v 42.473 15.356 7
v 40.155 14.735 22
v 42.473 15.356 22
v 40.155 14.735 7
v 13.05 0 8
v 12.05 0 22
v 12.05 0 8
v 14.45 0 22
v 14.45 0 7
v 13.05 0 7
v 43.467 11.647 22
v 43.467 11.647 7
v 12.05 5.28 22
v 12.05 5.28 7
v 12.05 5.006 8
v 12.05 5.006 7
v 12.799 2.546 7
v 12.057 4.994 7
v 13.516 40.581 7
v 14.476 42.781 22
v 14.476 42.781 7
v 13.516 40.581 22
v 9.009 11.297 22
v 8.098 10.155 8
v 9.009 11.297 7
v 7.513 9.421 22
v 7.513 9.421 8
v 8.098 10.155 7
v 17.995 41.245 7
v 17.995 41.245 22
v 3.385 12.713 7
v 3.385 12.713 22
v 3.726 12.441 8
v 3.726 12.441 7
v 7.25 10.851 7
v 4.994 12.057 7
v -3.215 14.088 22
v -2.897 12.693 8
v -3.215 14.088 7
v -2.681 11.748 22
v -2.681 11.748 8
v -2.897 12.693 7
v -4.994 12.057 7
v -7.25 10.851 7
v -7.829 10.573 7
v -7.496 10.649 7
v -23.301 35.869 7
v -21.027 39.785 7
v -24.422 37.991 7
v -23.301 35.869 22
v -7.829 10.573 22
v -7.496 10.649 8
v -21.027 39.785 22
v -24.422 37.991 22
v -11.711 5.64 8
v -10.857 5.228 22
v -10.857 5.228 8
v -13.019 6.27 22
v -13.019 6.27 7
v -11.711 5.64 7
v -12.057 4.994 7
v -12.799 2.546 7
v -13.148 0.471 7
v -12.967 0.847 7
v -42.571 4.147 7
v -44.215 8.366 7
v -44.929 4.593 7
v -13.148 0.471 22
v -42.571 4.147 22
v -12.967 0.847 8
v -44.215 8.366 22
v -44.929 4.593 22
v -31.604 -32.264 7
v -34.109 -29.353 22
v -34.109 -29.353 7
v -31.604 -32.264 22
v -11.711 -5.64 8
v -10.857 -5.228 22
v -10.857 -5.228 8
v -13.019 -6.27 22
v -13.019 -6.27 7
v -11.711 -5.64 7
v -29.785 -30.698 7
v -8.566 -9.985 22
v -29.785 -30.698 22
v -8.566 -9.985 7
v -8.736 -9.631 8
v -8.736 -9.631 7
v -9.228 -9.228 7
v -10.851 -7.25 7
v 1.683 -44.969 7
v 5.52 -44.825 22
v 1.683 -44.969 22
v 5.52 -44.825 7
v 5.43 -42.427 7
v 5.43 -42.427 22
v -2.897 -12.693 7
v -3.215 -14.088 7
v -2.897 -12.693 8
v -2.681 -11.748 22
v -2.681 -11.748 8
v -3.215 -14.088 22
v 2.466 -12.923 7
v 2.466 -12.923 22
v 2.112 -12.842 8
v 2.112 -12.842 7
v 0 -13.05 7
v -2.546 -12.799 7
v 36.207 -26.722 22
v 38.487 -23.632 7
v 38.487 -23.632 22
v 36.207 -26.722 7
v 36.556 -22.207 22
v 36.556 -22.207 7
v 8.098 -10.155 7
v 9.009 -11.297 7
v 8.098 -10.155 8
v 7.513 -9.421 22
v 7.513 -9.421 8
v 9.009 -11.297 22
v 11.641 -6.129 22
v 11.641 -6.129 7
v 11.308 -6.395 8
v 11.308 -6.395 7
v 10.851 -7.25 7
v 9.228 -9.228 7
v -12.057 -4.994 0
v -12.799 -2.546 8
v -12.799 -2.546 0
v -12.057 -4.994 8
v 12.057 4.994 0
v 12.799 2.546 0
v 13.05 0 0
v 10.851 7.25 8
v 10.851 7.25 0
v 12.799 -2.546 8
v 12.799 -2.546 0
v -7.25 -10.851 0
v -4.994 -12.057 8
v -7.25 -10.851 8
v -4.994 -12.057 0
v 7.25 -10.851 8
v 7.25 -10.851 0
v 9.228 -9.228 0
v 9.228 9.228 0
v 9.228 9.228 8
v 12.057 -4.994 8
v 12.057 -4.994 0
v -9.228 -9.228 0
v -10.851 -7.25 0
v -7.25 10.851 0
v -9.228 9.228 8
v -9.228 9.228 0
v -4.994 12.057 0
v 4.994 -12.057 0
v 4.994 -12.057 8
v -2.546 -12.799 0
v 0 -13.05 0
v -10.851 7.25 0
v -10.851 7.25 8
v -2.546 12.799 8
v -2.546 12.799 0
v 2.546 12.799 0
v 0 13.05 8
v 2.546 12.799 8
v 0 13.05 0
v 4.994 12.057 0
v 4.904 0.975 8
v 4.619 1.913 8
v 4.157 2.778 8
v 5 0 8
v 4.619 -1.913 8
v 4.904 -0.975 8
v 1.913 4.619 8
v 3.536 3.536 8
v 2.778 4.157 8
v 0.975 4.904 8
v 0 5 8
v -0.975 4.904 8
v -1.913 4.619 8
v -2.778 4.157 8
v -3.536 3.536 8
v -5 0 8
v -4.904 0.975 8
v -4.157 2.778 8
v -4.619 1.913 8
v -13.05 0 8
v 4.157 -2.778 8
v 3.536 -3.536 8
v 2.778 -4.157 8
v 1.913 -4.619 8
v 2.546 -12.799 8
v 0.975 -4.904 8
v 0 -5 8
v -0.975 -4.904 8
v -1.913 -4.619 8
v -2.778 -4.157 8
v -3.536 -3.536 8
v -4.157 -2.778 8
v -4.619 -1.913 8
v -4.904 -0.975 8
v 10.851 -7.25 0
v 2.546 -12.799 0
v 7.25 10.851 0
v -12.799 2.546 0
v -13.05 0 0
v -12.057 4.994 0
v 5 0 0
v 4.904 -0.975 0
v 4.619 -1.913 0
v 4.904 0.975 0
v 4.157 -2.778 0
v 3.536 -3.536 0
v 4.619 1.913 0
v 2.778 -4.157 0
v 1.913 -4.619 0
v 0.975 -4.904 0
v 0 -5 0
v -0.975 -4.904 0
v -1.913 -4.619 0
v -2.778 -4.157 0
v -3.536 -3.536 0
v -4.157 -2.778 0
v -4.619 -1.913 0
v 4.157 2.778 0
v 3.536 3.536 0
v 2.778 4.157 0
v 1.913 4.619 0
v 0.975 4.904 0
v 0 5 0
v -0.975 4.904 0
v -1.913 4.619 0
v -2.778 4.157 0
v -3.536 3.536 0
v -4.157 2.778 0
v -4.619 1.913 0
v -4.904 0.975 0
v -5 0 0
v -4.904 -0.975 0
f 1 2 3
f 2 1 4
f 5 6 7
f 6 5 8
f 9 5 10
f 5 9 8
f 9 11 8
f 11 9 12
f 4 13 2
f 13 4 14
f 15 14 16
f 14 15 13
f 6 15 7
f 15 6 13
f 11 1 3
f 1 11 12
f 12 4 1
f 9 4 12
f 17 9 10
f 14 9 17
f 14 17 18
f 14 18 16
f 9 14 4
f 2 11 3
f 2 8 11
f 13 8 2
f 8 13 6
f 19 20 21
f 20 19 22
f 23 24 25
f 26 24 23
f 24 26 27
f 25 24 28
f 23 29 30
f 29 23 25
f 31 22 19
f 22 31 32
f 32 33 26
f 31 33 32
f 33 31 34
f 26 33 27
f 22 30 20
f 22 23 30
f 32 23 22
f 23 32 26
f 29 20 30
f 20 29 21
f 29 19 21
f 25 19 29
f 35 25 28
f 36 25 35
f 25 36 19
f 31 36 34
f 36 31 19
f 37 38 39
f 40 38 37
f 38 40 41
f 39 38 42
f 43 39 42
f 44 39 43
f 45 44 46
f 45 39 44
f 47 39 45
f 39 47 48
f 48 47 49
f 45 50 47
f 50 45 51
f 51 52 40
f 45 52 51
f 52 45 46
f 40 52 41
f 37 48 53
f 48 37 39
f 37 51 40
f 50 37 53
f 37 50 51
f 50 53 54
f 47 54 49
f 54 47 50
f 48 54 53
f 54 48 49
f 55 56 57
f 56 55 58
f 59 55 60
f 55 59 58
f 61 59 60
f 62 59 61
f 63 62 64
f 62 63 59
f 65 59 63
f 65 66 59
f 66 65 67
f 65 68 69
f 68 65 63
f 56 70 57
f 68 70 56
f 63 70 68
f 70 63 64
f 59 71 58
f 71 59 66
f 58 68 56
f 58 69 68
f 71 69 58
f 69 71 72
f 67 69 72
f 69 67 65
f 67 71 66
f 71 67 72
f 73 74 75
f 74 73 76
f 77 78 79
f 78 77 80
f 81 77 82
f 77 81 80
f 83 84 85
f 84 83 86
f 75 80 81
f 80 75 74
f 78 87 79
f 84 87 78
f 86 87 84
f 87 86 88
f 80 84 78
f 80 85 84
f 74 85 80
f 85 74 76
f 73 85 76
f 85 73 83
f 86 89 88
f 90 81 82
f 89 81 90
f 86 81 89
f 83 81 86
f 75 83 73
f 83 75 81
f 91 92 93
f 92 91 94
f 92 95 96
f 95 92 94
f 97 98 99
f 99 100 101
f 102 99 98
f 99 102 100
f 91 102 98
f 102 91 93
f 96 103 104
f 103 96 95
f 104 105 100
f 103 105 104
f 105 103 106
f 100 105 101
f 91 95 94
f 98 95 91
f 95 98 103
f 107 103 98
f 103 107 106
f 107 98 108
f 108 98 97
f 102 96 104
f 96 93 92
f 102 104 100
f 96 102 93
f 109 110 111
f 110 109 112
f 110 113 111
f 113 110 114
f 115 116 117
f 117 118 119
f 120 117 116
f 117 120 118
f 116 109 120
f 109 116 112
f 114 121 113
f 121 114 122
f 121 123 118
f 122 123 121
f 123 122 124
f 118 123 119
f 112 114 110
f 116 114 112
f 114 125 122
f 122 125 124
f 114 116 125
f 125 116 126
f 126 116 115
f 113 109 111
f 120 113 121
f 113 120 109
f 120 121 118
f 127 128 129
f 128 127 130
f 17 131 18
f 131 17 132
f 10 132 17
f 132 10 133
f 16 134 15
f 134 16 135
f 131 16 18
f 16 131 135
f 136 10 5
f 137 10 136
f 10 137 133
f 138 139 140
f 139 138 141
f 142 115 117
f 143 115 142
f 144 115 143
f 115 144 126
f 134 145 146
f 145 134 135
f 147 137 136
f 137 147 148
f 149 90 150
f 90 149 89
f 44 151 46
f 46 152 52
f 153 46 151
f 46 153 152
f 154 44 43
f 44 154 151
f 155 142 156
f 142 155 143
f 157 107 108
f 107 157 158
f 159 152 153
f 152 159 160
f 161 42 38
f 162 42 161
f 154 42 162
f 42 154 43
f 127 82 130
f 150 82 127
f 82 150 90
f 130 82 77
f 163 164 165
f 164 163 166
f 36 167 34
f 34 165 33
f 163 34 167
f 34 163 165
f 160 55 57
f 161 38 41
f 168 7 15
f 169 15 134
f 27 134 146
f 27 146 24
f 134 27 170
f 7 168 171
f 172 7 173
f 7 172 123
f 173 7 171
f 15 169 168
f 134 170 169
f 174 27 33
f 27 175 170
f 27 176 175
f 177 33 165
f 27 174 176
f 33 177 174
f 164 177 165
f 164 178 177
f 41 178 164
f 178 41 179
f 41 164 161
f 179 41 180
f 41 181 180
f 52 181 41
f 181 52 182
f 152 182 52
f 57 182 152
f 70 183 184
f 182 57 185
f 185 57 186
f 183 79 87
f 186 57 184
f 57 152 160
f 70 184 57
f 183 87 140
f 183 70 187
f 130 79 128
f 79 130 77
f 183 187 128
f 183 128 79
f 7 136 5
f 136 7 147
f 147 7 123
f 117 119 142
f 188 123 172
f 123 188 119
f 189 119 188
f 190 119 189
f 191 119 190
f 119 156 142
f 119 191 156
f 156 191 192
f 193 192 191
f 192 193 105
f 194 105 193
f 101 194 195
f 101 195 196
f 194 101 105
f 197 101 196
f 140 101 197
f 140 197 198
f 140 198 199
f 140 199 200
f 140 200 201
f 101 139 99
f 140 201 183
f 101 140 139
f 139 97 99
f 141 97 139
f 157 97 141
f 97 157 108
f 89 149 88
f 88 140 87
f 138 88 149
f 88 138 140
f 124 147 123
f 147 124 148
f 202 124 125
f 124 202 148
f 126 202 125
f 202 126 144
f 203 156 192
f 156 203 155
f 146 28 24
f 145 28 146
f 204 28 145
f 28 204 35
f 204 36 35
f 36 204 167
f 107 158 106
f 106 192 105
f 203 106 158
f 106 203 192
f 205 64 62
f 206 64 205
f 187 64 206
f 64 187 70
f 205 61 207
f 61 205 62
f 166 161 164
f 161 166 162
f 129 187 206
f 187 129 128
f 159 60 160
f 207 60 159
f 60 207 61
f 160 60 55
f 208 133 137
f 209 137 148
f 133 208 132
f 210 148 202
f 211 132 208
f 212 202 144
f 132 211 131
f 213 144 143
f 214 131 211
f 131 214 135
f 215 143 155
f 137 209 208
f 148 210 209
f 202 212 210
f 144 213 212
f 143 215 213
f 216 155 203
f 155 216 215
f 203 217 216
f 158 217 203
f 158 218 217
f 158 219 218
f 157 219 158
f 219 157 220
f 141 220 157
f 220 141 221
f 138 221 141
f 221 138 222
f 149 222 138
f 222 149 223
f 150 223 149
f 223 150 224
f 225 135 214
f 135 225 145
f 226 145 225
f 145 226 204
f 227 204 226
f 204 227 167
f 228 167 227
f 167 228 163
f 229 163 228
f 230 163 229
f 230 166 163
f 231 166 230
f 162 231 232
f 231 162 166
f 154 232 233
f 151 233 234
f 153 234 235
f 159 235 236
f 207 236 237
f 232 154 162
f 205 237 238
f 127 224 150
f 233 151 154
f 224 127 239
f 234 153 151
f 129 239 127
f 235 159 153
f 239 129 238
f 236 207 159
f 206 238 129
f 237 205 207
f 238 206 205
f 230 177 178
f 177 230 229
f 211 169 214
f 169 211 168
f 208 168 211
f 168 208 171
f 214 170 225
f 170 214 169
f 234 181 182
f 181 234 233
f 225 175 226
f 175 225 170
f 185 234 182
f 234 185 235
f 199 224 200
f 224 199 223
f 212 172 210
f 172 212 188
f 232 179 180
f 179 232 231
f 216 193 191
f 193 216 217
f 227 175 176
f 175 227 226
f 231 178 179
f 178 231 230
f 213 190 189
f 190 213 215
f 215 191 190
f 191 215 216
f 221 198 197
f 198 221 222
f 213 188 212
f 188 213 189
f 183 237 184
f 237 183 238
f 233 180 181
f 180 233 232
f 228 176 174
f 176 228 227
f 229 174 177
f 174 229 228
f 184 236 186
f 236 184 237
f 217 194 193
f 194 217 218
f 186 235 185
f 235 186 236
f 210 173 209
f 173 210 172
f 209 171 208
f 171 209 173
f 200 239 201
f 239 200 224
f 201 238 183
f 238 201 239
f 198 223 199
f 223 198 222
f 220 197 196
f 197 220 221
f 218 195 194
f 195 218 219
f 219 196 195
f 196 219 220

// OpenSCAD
$fn = 32;

// ----------------------------------------------------------------------
// Impeller: 90 mm, 7 blades, 22 mm tall
// ----------------------------------------------------------------------

// --- parameters (mm) ---
center_d = 26.1;          // hub diameter
center_h = 8;             // hub height
wheel_d = 90;             // outer diameter over the blades
blade_count = 7;          // number of blades
blade_t = 2.4;            // blade thickness
blade_h = 14;             // blade height
blade_in_r = 12.05;       // blade root radius
blade_out_r = 42.6;       // blade tip radius
sweep = 15;               // blade sweep, degrees
bore_d = 10;              // shaft bore

module hub() {
  cylinder(h = center_h, d = center_d);
}

module blade() {
  /* blade swept between two boxes: hull of the root and the tip section */
  hull() {
    translate([blade_in_r, 0, center_h - 1])
      cube([blade_t, blade_t * 2.2, blade_h + 1], center = false);
    rotate([0, 0, sweep])
      translate([blade_out_r, 0, center_h - 1])
        cube([blade_t, blade_t * 1.6, blade_h + 1], center = false);
  }
}

module blades() {
  for (i = [0 : blade_count - 1])
    rotate([0, 0, i * 360 / blade_count]) blade();
}

difference() {
  union() {
    hub();
    blades();
  }
  translate([0, 0, -1]) cylinder(h = center_h + blade_h + 0 + 3, d = bore_d);
}
